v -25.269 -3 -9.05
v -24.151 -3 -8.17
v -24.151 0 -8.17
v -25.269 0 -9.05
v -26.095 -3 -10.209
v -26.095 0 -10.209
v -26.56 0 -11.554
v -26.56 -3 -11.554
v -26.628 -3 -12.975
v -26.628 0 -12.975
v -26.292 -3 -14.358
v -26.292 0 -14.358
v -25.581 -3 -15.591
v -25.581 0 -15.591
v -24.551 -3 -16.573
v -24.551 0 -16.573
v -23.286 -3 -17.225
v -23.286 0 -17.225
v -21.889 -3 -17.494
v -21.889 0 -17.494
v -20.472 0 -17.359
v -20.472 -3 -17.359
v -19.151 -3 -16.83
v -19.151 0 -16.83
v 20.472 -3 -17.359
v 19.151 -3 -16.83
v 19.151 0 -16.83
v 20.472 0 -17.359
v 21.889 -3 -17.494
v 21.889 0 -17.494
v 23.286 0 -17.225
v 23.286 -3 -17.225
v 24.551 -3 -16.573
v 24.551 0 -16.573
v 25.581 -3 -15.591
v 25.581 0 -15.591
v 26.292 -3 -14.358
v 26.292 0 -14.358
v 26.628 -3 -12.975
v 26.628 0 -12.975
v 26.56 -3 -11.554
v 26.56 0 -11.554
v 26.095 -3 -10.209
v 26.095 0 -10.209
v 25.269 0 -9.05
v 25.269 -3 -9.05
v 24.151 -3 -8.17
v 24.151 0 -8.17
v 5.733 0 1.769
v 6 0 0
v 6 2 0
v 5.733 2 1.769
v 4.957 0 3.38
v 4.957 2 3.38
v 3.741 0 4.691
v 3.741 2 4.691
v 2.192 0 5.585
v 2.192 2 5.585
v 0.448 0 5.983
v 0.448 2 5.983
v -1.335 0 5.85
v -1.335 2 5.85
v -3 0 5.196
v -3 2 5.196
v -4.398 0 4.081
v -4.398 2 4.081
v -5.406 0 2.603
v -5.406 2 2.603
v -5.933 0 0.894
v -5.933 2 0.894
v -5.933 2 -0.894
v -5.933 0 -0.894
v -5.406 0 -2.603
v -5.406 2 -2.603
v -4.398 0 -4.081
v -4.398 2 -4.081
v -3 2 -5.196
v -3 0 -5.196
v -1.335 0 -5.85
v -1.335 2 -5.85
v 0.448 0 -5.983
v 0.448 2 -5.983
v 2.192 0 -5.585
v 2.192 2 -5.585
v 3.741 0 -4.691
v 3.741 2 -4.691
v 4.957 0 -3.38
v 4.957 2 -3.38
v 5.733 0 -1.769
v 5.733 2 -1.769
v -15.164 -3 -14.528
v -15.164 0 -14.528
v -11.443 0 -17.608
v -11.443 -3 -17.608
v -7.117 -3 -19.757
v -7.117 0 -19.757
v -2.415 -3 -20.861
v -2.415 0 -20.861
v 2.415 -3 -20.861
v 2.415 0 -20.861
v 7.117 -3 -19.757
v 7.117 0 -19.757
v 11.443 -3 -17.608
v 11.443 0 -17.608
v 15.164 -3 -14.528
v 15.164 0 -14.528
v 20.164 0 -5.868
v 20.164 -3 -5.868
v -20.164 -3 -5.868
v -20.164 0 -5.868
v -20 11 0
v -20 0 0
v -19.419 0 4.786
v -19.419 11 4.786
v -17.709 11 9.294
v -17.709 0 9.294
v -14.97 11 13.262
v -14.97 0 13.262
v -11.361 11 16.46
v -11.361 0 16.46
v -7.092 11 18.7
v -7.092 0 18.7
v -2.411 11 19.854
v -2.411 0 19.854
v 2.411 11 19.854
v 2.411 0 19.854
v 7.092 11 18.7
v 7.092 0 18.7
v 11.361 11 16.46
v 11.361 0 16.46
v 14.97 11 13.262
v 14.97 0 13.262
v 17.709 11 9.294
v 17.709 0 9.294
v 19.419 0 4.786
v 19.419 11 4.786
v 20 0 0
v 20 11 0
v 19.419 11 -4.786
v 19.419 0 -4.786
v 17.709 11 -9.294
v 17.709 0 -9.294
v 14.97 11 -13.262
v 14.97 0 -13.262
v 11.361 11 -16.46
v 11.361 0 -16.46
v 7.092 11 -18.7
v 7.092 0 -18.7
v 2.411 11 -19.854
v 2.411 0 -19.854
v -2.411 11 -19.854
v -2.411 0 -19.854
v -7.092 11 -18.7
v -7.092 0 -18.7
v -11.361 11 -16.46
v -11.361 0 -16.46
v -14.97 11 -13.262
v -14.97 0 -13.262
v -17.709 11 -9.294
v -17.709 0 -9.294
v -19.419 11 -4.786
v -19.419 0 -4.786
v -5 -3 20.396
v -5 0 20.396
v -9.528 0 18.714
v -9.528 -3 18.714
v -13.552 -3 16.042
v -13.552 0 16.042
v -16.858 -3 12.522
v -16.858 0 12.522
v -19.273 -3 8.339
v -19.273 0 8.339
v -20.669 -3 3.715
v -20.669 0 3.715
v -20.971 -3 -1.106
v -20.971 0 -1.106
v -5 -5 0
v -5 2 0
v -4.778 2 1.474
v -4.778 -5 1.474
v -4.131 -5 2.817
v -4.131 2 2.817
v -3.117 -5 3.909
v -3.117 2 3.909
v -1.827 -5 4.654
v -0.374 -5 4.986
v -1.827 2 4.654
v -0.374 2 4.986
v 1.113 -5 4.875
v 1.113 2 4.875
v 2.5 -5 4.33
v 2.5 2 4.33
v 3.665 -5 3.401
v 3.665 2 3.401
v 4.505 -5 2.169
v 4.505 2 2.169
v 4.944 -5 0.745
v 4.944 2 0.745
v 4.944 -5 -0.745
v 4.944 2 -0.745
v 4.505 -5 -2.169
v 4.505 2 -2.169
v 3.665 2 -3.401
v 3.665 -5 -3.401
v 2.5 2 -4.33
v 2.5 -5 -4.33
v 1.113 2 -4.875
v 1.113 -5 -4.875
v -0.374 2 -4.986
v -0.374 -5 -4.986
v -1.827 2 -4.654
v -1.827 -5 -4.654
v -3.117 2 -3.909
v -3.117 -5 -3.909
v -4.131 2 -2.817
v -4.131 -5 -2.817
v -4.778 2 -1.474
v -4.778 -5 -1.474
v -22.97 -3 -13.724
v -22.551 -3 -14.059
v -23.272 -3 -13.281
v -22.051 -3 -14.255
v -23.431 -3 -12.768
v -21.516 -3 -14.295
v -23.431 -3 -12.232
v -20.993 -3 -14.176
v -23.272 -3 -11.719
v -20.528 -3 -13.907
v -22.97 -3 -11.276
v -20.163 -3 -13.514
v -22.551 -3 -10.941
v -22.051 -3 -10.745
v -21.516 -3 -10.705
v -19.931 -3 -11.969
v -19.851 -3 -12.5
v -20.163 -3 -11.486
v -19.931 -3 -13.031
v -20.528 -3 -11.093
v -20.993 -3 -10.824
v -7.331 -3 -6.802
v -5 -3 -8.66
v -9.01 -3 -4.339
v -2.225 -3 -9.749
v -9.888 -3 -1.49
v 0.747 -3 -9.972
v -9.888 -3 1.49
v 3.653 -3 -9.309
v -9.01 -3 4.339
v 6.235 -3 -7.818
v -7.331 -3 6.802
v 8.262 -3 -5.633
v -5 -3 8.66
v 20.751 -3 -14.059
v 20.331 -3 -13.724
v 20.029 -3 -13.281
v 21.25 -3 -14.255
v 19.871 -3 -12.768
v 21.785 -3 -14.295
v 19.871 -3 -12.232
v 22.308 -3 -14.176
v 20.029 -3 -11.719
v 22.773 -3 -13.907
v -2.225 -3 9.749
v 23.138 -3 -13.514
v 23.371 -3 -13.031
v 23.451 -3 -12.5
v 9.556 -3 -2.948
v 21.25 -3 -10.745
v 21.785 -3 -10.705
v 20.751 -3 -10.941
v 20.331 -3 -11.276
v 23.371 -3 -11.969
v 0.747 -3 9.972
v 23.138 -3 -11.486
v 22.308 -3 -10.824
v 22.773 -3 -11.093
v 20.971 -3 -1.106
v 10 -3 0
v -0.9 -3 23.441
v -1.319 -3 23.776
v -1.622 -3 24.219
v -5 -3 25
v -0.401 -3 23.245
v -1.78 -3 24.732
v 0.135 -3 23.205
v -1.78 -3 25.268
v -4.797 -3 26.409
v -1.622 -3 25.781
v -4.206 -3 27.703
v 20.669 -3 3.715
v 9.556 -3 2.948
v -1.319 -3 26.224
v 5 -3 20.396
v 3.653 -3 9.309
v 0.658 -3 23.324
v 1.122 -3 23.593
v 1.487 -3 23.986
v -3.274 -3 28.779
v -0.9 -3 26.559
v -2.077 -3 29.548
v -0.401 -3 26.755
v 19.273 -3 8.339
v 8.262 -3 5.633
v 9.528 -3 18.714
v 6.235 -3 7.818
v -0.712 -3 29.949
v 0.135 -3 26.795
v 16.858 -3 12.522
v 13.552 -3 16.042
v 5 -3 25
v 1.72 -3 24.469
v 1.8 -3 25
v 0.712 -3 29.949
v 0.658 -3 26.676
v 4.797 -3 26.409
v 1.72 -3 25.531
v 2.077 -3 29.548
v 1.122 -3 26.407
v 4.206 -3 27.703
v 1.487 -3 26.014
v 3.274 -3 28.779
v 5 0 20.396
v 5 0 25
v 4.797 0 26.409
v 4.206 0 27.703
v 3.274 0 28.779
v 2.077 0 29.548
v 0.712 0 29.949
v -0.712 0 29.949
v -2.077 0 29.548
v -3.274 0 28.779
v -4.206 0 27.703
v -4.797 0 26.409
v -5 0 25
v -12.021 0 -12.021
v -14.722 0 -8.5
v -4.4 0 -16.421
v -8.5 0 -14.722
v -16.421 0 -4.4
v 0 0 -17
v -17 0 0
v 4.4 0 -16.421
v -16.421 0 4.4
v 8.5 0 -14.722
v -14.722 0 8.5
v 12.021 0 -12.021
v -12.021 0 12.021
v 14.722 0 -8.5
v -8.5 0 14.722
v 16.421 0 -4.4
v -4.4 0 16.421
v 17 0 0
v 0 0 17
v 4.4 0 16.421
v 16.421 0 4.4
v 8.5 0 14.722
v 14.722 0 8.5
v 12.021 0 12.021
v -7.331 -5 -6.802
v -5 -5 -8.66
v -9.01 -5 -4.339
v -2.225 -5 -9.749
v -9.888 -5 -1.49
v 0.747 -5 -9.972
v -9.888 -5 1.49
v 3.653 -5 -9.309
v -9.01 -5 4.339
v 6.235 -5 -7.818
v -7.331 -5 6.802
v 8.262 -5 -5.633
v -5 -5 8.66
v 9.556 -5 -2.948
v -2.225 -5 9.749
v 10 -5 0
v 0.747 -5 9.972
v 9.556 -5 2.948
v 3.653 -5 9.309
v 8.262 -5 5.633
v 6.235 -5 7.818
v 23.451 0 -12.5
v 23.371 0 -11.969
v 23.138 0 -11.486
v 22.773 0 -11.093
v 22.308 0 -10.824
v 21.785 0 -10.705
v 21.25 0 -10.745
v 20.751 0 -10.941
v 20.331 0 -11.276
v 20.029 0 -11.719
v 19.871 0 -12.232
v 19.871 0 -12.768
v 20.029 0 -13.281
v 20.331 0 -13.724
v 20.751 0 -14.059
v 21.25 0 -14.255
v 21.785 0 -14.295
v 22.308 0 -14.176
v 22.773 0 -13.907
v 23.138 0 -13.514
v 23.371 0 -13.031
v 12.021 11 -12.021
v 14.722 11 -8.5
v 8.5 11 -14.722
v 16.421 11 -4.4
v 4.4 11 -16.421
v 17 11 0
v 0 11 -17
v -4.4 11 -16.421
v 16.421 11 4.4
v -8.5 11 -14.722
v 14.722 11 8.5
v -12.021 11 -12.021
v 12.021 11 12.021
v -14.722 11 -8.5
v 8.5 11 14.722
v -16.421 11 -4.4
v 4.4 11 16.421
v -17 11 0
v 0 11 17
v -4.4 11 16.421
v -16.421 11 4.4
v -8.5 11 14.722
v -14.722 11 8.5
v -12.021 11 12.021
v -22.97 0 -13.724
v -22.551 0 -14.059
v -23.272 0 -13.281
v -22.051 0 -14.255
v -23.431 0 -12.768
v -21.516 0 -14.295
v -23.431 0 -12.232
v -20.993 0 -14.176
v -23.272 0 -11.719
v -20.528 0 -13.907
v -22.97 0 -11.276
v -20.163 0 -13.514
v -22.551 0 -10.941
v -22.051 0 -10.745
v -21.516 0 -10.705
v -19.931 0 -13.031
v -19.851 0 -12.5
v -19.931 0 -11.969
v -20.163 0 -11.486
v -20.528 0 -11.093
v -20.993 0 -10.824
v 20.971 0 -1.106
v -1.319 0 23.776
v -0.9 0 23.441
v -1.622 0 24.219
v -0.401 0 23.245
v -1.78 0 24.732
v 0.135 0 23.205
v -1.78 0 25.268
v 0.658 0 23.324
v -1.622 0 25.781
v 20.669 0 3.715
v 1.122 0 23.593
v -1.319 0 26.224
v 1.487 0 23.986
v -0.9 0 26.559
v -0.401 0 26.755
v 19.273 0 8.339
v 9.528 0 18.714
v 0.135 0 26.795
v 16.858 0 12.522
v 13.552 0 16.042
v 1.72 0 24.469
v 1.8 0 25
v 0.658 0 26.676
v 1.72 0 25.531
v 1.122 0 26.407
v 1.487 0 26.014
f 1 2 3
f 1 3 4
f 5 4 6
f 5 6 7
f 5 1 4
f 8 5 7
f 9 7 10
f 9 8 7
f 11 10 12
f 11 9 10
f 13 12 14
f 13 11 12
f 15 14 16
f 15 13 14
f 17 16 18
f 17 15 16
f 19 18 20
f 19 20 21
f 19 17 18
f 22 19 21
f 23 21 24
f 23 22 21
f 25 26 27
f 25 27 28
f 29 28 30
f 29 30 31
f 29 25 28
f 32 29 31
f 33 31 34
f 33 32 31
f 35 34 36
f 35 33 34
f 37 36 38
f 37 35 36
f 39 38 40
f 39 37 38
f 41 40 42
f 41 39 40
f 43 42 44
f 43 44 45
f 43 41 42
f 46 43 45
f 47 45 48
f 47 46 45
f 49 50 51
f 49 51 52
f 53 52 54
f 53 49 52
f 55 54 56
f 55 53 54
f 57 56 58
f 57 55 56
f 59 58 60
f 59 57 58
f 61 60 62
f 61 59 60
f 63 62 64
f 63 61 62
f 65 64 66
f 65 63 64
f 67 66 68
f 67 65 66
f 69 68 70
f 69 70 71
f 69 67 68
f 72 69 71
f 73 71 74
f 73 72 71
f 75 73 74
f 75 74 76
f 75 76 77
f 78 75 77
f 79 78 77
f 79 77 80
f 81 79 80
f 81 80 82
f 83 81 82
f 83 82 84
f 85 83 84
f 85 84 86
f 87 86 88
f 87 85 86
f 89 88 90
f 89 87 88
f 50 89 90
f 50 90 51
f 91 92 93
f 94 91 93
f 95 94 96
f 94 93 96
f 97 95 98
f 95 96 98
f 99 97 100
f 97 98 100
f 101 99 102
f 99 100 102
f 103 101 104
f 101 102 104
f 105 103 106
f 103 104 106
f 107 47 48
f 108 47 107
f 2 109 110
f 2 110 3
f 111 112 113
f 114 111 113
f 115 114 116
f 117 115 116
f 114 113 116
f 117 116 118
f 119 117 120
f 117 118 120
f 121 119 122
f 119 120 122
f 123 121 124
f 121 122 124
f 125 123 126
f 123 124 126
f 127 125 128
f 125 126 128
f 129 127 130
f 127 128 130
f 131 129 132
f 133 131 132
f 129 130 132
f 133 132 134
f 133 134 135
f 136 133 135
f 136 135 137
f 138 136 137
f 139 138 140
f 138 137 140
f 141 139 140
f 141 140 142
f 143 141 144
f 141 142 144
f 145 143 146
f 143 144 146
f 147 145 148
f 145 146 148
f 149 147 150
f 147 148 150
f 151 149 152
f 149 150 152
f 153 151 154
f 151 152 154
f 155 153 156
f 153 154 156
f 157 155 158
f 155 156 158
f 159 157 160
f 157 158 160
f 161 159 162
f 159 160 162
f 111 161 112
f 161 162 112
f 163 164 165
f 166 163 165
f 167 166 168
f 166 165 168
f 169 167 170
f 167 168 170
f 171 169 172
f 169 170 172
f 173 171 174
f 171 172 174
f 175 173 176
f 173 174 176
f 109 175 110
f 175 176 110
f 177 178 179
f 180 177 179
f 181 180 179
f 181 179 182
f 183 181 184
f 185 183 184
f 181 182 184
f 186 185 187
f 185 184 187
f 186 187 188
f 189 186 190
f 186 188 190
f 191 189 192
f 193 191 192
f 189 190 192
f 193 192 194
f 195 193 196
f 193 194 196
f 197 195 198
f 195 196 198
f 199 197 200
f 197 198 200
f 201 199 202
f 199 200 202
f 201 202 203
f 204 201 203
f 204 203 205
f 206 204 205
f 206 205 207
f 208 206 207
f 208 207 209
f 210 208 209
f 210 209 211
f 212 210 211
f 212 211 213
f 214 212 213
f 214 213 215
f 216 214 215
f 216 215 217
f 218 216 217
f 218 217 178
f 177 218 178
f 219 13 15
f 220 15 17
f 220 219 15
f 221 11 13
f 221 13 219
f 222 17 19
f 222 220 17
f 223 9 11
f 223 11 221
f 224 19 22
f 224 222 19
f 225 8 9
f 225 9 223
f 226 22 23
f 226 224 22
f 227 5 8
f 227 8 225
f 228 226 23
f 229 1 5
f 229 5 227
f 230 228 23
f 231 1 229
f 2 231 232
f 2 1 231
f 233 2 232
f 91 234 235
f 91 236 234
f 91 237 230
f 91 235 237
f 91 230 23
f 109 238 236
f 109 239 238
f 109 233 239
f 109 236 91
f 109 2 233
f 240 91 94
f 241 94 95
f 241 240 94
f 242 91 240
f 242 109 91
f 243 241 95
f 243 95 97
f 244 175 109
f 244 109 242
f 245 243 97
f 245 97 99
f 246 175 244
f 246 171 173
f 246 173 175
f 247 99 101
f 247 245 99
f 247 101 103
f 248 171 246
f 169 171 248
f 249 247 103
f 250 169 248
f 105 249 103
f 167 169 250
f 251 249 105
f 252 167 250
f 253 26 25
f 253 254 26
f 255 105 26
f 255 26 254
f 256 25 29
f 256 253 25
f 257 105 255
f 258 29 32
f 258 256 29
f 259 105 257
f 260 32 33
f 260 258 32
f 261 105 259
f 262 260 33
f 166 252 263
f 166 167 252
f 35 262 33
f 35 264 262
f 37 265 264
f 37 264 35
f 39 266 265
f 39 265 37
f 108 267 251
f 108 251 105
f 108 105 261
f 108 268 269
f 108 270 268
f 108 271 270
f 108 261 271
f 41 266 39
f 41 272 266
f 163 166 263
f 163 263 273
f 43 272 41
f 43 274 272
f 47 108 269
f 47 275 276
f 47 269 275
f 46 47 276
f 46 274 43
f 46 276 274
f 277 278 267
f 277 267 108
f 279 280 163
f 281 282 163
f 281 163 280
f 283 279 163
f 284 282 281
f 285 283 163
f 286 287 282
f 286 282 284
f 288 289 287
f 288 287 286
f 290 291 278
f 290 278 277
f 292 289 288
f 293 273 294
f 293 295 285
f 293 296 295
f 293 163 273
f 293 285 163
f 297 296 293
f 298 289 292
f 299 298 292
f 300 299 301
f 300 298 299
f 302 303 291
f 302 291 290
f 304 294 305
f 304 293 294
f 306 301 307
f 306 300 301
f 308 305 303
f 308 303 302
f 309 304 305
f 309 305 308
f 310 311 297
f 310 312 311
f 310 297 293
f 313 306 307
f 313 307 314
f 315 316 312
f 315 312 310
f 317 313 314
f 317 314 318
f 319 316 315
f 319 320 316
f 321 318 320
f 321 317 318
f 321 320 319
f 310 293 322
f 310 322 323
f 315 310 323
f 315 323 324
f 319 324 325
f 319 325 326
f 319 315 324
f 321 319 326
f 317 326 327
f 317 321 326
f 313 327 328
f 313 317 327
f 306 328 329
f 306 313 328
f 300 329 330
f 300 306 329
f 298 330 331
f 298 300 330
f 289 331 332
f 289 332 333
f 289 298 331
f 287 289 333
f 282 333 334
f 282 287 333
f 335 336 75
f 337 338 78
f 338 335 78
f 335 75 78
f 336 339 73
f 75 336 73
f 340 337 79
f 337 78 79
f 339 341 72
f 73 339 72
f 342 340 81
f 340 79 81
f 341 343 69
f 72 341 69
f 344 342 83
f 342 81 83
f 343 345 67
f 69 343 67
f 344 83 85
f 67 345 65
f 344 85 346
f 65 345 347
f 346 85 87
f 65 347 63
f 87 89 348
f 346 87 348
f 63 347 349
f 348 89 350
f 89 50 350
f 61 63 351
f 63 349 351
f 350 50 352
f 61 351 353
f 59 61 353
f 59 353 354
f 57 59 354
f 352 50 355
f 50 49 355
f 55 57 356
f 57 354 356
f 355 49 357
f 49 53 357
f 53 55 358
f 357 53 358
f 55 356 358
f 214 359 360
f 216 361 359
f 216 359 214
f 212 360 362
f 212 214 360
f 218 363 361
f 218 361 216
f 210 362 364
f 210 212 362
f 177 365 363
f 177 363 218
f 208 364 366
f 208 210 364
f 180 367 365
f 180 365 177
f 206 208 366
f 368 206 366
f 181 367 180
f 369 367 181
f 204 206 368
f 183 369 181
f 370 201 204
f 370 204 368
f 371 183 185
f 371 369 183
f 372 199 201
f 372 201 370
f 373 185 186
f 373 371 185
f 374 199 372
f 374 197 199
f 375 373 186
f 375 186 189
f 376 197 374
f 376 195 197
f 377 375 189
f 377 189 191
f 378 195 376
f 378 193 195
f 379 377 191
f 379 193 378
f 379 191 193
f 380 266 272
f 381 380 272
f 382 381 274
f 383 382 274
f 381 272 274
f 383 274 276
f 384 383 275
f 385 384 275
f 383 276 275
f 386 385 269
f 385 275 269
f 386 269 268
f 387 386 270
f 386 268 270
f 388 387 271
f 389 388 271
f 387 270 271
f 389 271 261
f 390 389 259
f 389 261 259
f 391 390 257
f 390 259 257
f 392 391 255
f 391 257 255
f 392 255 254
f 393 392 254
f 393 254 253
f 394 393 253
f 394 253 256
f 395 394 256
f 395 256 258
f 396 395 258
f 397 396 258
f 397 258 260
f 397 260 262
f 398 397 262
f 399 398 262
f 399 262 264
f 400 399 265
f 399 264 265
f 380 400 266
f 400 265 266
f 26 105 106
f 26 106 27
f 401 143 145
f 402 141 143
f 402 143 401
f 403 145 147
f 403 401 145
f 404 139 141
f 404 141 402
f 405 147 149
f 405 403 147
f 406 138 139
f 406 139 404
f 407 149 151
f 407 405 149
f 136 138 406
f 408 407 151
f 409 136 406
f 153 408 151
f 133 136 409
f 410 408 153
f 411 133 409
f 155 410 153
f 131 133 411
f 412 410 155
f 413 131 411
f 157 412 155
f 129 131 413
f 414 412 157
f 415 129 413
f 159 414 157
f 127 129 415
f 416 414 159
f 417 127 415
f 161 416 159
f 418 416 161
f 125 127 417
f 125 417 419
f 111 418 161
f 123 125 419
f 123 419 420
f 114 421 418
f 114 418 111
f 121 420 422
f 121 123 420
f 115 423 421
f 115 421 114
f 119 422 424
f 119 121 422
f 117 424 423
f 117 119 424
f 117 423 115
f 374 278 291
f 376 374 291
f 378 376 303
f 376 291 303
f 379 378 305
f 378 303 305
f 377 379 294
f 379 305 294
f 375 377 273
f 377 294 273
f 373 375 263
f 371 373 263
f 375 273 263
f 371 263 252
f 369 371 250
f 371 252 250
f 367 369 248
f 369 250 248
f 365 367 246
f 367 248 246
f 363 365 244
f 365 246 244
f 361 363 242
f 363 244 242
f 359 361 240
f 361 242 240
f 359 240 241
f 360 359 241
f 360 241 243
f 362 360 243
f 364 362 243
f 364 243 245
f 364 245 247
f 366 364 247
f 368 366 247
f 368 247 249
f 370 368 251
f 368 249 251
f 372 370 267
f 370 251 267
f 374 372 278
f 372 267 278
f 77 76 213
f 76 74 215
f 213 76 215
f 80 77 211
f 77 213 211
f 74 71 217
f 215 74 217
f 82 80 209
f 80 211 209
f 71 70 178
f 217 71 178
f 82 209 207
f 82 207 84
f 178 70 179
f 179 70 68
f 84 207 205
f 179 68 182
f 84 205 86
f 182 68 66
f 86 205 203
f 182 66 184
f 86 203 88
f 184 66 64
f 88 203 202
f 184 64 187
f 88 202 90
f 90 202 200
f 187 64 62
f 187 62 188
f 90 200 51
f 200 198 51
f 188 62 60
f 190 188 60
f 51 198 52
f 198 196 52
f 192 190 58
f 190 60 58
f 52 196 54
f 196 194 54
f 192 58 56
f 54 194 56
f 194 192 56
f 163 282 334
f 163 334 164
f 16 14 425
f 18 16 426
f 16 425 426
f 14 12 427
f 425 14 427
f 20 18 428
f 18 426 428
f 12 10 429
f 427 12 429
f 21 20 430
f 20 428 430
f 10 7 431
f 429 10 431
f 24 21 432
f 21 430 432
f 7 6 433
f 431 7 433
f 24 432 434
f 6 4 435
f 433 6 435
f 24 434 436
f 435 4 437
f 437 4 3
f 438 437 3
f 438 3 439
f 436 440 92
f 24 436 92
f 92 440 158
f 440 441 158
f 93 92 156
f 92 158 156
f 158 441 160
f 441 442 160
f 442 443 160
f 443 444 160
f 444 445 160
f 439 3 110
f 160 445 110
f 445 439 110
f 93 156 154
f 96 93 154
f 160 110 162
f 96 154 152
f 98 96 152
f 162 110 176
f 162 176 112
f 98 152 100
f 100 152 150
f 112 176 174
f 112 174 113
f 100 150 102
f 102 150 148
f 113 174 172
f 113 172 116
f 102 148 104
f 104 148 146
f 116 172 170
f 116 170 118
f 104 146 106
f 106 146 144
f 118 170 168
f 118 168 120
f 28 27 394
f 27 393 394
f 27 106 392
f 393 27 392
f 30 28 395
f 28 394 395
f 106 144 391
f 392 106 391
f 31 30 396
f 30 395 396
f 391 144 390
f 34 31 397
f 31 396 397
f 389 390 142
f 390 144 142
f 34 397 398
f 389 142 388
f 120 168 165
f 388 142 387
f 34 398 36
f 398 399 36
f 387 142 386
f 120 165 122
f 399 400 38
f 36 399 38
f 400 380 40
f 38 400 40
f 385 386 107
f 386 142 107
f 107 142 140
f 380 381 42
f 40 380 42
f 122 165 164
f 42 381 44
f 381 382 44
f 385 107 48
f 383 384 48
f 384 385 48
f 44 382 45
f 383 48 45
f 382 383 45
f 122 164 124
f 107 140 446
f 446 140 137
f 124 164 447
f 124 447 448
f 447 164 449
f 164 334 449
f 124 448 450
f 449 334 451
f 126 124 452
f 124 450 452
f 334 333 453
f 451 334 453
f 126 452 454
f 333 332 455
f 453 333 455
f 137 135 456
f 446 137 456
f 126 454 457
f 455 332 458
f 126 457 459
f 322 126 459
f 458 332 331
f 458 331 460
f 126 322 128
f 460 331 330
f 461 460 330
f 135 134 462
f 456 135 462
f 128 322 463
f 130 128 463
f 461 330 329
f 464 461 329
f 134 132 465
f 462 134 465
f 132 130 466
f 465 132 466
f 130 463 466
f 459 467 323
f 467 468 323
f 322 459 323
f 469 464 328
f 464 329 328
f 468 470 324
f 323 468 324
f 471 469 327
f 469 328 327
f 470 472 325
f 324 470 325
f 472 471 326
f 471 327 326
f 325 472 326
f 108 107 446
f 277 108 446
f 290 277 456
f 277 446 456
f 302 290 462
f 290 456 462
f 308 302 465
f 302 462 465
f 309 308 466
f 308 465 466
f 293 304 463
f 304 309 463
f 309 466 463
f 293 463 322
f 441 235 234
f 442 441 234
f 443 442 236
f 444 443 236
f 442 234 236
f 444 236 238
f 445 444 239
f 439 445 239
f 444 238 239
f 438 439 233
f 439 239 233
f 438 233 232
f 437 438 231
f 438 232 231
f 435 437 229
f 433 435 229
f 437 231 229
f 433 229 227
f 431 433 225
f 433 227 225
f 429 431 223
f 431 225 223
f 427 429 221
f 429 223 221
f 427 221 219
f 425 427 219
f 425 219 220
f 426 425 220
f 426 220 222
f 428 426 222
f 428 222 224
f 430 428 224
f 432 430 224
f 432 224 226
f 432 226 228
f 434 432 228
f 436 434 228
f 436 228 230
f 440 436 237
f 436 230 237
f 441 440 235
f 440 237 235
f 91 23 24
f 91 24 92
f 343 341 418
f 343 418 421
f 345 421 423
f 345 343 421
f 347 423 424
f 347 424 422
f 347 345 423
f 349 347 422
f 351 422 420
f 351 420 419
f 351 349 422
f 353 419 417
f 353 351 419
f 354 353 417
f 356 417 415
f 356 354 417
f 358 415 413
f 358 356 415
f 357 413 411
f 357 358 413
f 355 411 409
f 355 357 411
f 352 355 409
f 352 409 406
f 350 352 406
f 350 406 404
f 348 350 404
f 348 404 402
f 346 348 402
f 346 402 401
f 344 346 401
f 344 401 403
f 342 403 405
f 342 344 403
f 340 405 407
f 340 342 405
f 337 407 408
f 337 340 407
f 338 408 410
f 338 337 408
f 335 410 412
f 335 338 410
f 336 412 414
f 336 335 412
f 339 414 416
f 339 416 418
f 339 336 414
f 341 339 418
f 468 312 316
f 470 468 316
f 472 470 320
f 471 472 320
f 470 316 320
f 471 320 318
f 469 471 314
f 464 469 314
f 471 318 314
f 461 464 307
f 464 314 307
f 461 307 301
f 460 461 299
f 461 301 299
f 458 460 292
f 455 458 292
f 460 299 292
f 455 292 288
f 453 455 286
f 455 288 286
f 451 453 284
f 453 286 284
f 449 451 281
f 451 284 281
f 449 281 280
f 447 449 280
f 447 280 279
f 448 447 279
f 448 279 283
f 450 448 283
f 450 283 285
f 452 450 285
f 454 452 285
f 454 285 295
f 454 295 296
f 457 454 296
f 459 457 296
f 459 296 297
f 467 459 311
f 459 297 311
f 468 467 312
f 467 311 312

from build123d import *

# Parameters (mm, degrees)
F0_R      = 21
F1_DEPTH  = 3
F2_R      = 3.35
F2_R_2    = 1.8
F3_DEPTH  = 3
F4_R      = 20
F4_R_2    = 17
F5_DEPTH  = 11
F6_R      = 6
F6_R_2    = 5
F7_DEPTH  = 2
F8_R      = 10
F9_DEPTH  = 2
F10_R     = 5
F11_DEPTH = 46.6


with BuildPart() as f1:
    # F0 (on Front) → F1 (new body)
    with BuildSketch(Plane.XZ):
        Circle(F0_R)
    extrude(amount=F1_DEPTH)

    # F2 (on face) → F3 (join)
    with BuildSketch(Plane.XZ.offset(3)):
        with BuildLine():
            Line((5, 20.3960780544), (5, 25))
            ThreePointArc((5, 25), (0, 30), (-5, 25))
            Line((-5, 25), (-5, 20.3960780544))
            ThreePointArc((-5, 20.3960780544), (0, 21), (5, 20.3960780544))
        make_face()
        with Locations((0, 25)):
            Circle(F2_R, mode=Mode.SUBTRACT)
        with BuildLine():
            Line((24.1506350946, -8.1698729811), (20.1635217327, -5.8679120083))
            ThreePointArc((20.1635217327, -5.8679120083), (18.1865334795, -10.5), (15.1635217327, -14.5281660461))
            Line((15.1635217327, -14.5281660461), (19.1506350946, -16.8301270189))
            ThreePointArc((19.1506350946, -16.8301270189), (25.9807621135, -15), (24.1506350946, -8.1698729811))
        make_face()
        with Locations((21.6506350946, -12.5)):
            Circle(F2_R, mode=Mode.SUBTRACT)
        with BuildLine():
            ThreePointArc((-15.1635217327, -14.5281660461), (-18.1865334795, -10.5), (-20.1635217327, -5.8679120083))
            Line((-20.1635217327, -5.8679120083), (-24.1506350946, -8.1698729811))
            ThreePointArc((-24.1506350946, -8.1698729811), (-25.9807621135, -15), (-19.1506350946, -16.8301270189))
            Line((-19.1506350946, -16.8301270189), (-15.1635217327, -14.5281660461))
        make_face()
        with Locations((-21.6506350946, -12.5)):
            Circle(F2_R, mode=Mode.SUBTRACT)
        with Locations((0, 25)):
            Circle(F2_R)
        with Locations((0, 25)):
            Circle(F2_R_2, mode=Mode.SUBTRACT)
        with Locations((-21.6506350946, -12.5)):
            Circle(F2_R)
        with Locations((-21.6506350946, -12.5)):
            Circle(F2_R_2, mode=Mode.SUBTRACT)
        with Locations((21.6506350946, -12.5)):
            Circle(F2_R)
        with Locations((21.6506350946, -12.5)):
            Circle(F2_R_2, mode=Mode.SUBTRACT)
    extrude(amount=-F3_DEPTH)

    # F4 (on face) → F5 (join)
    with BuildSketch(Plane(origin=(0, 0, 0), x_dir=(-1, 0, 0), z_dir=(0, 1, 0))):
        Circle(F4_R)
        Circle(F4_R_2, mode=Mode.SUBTRACT)
    extrude(amount=F5_DEPTH)

    # F6 (on Front) → F7 (join)
    with BuildSketch(Plane.XZ):
        Circle(F6_R)
        Circle(F6_R_2, mode=Mode.SUBTRACT)
        Circle(F6_R_2)
    extrude(amount=-F7_DEPTH)

    # F8 (on face) → F9 (join)
    with BuildSketch(Plane.XZ.offset(3)):
        Circle(F8_R)
    extrude(amount=F9_DEPTH)

    # F10 (on face) → F11 (cut)
    with BuildSketch(Plane(origin=(0, 2, 0), x_dir=(-1, 0, 0), z_dir=(0, 1, 0))):
        Circle(F10_R)
    extrude(amount=-F11_DEPTH, mode=Mode.SUBTRACT)


solid = f1.part
